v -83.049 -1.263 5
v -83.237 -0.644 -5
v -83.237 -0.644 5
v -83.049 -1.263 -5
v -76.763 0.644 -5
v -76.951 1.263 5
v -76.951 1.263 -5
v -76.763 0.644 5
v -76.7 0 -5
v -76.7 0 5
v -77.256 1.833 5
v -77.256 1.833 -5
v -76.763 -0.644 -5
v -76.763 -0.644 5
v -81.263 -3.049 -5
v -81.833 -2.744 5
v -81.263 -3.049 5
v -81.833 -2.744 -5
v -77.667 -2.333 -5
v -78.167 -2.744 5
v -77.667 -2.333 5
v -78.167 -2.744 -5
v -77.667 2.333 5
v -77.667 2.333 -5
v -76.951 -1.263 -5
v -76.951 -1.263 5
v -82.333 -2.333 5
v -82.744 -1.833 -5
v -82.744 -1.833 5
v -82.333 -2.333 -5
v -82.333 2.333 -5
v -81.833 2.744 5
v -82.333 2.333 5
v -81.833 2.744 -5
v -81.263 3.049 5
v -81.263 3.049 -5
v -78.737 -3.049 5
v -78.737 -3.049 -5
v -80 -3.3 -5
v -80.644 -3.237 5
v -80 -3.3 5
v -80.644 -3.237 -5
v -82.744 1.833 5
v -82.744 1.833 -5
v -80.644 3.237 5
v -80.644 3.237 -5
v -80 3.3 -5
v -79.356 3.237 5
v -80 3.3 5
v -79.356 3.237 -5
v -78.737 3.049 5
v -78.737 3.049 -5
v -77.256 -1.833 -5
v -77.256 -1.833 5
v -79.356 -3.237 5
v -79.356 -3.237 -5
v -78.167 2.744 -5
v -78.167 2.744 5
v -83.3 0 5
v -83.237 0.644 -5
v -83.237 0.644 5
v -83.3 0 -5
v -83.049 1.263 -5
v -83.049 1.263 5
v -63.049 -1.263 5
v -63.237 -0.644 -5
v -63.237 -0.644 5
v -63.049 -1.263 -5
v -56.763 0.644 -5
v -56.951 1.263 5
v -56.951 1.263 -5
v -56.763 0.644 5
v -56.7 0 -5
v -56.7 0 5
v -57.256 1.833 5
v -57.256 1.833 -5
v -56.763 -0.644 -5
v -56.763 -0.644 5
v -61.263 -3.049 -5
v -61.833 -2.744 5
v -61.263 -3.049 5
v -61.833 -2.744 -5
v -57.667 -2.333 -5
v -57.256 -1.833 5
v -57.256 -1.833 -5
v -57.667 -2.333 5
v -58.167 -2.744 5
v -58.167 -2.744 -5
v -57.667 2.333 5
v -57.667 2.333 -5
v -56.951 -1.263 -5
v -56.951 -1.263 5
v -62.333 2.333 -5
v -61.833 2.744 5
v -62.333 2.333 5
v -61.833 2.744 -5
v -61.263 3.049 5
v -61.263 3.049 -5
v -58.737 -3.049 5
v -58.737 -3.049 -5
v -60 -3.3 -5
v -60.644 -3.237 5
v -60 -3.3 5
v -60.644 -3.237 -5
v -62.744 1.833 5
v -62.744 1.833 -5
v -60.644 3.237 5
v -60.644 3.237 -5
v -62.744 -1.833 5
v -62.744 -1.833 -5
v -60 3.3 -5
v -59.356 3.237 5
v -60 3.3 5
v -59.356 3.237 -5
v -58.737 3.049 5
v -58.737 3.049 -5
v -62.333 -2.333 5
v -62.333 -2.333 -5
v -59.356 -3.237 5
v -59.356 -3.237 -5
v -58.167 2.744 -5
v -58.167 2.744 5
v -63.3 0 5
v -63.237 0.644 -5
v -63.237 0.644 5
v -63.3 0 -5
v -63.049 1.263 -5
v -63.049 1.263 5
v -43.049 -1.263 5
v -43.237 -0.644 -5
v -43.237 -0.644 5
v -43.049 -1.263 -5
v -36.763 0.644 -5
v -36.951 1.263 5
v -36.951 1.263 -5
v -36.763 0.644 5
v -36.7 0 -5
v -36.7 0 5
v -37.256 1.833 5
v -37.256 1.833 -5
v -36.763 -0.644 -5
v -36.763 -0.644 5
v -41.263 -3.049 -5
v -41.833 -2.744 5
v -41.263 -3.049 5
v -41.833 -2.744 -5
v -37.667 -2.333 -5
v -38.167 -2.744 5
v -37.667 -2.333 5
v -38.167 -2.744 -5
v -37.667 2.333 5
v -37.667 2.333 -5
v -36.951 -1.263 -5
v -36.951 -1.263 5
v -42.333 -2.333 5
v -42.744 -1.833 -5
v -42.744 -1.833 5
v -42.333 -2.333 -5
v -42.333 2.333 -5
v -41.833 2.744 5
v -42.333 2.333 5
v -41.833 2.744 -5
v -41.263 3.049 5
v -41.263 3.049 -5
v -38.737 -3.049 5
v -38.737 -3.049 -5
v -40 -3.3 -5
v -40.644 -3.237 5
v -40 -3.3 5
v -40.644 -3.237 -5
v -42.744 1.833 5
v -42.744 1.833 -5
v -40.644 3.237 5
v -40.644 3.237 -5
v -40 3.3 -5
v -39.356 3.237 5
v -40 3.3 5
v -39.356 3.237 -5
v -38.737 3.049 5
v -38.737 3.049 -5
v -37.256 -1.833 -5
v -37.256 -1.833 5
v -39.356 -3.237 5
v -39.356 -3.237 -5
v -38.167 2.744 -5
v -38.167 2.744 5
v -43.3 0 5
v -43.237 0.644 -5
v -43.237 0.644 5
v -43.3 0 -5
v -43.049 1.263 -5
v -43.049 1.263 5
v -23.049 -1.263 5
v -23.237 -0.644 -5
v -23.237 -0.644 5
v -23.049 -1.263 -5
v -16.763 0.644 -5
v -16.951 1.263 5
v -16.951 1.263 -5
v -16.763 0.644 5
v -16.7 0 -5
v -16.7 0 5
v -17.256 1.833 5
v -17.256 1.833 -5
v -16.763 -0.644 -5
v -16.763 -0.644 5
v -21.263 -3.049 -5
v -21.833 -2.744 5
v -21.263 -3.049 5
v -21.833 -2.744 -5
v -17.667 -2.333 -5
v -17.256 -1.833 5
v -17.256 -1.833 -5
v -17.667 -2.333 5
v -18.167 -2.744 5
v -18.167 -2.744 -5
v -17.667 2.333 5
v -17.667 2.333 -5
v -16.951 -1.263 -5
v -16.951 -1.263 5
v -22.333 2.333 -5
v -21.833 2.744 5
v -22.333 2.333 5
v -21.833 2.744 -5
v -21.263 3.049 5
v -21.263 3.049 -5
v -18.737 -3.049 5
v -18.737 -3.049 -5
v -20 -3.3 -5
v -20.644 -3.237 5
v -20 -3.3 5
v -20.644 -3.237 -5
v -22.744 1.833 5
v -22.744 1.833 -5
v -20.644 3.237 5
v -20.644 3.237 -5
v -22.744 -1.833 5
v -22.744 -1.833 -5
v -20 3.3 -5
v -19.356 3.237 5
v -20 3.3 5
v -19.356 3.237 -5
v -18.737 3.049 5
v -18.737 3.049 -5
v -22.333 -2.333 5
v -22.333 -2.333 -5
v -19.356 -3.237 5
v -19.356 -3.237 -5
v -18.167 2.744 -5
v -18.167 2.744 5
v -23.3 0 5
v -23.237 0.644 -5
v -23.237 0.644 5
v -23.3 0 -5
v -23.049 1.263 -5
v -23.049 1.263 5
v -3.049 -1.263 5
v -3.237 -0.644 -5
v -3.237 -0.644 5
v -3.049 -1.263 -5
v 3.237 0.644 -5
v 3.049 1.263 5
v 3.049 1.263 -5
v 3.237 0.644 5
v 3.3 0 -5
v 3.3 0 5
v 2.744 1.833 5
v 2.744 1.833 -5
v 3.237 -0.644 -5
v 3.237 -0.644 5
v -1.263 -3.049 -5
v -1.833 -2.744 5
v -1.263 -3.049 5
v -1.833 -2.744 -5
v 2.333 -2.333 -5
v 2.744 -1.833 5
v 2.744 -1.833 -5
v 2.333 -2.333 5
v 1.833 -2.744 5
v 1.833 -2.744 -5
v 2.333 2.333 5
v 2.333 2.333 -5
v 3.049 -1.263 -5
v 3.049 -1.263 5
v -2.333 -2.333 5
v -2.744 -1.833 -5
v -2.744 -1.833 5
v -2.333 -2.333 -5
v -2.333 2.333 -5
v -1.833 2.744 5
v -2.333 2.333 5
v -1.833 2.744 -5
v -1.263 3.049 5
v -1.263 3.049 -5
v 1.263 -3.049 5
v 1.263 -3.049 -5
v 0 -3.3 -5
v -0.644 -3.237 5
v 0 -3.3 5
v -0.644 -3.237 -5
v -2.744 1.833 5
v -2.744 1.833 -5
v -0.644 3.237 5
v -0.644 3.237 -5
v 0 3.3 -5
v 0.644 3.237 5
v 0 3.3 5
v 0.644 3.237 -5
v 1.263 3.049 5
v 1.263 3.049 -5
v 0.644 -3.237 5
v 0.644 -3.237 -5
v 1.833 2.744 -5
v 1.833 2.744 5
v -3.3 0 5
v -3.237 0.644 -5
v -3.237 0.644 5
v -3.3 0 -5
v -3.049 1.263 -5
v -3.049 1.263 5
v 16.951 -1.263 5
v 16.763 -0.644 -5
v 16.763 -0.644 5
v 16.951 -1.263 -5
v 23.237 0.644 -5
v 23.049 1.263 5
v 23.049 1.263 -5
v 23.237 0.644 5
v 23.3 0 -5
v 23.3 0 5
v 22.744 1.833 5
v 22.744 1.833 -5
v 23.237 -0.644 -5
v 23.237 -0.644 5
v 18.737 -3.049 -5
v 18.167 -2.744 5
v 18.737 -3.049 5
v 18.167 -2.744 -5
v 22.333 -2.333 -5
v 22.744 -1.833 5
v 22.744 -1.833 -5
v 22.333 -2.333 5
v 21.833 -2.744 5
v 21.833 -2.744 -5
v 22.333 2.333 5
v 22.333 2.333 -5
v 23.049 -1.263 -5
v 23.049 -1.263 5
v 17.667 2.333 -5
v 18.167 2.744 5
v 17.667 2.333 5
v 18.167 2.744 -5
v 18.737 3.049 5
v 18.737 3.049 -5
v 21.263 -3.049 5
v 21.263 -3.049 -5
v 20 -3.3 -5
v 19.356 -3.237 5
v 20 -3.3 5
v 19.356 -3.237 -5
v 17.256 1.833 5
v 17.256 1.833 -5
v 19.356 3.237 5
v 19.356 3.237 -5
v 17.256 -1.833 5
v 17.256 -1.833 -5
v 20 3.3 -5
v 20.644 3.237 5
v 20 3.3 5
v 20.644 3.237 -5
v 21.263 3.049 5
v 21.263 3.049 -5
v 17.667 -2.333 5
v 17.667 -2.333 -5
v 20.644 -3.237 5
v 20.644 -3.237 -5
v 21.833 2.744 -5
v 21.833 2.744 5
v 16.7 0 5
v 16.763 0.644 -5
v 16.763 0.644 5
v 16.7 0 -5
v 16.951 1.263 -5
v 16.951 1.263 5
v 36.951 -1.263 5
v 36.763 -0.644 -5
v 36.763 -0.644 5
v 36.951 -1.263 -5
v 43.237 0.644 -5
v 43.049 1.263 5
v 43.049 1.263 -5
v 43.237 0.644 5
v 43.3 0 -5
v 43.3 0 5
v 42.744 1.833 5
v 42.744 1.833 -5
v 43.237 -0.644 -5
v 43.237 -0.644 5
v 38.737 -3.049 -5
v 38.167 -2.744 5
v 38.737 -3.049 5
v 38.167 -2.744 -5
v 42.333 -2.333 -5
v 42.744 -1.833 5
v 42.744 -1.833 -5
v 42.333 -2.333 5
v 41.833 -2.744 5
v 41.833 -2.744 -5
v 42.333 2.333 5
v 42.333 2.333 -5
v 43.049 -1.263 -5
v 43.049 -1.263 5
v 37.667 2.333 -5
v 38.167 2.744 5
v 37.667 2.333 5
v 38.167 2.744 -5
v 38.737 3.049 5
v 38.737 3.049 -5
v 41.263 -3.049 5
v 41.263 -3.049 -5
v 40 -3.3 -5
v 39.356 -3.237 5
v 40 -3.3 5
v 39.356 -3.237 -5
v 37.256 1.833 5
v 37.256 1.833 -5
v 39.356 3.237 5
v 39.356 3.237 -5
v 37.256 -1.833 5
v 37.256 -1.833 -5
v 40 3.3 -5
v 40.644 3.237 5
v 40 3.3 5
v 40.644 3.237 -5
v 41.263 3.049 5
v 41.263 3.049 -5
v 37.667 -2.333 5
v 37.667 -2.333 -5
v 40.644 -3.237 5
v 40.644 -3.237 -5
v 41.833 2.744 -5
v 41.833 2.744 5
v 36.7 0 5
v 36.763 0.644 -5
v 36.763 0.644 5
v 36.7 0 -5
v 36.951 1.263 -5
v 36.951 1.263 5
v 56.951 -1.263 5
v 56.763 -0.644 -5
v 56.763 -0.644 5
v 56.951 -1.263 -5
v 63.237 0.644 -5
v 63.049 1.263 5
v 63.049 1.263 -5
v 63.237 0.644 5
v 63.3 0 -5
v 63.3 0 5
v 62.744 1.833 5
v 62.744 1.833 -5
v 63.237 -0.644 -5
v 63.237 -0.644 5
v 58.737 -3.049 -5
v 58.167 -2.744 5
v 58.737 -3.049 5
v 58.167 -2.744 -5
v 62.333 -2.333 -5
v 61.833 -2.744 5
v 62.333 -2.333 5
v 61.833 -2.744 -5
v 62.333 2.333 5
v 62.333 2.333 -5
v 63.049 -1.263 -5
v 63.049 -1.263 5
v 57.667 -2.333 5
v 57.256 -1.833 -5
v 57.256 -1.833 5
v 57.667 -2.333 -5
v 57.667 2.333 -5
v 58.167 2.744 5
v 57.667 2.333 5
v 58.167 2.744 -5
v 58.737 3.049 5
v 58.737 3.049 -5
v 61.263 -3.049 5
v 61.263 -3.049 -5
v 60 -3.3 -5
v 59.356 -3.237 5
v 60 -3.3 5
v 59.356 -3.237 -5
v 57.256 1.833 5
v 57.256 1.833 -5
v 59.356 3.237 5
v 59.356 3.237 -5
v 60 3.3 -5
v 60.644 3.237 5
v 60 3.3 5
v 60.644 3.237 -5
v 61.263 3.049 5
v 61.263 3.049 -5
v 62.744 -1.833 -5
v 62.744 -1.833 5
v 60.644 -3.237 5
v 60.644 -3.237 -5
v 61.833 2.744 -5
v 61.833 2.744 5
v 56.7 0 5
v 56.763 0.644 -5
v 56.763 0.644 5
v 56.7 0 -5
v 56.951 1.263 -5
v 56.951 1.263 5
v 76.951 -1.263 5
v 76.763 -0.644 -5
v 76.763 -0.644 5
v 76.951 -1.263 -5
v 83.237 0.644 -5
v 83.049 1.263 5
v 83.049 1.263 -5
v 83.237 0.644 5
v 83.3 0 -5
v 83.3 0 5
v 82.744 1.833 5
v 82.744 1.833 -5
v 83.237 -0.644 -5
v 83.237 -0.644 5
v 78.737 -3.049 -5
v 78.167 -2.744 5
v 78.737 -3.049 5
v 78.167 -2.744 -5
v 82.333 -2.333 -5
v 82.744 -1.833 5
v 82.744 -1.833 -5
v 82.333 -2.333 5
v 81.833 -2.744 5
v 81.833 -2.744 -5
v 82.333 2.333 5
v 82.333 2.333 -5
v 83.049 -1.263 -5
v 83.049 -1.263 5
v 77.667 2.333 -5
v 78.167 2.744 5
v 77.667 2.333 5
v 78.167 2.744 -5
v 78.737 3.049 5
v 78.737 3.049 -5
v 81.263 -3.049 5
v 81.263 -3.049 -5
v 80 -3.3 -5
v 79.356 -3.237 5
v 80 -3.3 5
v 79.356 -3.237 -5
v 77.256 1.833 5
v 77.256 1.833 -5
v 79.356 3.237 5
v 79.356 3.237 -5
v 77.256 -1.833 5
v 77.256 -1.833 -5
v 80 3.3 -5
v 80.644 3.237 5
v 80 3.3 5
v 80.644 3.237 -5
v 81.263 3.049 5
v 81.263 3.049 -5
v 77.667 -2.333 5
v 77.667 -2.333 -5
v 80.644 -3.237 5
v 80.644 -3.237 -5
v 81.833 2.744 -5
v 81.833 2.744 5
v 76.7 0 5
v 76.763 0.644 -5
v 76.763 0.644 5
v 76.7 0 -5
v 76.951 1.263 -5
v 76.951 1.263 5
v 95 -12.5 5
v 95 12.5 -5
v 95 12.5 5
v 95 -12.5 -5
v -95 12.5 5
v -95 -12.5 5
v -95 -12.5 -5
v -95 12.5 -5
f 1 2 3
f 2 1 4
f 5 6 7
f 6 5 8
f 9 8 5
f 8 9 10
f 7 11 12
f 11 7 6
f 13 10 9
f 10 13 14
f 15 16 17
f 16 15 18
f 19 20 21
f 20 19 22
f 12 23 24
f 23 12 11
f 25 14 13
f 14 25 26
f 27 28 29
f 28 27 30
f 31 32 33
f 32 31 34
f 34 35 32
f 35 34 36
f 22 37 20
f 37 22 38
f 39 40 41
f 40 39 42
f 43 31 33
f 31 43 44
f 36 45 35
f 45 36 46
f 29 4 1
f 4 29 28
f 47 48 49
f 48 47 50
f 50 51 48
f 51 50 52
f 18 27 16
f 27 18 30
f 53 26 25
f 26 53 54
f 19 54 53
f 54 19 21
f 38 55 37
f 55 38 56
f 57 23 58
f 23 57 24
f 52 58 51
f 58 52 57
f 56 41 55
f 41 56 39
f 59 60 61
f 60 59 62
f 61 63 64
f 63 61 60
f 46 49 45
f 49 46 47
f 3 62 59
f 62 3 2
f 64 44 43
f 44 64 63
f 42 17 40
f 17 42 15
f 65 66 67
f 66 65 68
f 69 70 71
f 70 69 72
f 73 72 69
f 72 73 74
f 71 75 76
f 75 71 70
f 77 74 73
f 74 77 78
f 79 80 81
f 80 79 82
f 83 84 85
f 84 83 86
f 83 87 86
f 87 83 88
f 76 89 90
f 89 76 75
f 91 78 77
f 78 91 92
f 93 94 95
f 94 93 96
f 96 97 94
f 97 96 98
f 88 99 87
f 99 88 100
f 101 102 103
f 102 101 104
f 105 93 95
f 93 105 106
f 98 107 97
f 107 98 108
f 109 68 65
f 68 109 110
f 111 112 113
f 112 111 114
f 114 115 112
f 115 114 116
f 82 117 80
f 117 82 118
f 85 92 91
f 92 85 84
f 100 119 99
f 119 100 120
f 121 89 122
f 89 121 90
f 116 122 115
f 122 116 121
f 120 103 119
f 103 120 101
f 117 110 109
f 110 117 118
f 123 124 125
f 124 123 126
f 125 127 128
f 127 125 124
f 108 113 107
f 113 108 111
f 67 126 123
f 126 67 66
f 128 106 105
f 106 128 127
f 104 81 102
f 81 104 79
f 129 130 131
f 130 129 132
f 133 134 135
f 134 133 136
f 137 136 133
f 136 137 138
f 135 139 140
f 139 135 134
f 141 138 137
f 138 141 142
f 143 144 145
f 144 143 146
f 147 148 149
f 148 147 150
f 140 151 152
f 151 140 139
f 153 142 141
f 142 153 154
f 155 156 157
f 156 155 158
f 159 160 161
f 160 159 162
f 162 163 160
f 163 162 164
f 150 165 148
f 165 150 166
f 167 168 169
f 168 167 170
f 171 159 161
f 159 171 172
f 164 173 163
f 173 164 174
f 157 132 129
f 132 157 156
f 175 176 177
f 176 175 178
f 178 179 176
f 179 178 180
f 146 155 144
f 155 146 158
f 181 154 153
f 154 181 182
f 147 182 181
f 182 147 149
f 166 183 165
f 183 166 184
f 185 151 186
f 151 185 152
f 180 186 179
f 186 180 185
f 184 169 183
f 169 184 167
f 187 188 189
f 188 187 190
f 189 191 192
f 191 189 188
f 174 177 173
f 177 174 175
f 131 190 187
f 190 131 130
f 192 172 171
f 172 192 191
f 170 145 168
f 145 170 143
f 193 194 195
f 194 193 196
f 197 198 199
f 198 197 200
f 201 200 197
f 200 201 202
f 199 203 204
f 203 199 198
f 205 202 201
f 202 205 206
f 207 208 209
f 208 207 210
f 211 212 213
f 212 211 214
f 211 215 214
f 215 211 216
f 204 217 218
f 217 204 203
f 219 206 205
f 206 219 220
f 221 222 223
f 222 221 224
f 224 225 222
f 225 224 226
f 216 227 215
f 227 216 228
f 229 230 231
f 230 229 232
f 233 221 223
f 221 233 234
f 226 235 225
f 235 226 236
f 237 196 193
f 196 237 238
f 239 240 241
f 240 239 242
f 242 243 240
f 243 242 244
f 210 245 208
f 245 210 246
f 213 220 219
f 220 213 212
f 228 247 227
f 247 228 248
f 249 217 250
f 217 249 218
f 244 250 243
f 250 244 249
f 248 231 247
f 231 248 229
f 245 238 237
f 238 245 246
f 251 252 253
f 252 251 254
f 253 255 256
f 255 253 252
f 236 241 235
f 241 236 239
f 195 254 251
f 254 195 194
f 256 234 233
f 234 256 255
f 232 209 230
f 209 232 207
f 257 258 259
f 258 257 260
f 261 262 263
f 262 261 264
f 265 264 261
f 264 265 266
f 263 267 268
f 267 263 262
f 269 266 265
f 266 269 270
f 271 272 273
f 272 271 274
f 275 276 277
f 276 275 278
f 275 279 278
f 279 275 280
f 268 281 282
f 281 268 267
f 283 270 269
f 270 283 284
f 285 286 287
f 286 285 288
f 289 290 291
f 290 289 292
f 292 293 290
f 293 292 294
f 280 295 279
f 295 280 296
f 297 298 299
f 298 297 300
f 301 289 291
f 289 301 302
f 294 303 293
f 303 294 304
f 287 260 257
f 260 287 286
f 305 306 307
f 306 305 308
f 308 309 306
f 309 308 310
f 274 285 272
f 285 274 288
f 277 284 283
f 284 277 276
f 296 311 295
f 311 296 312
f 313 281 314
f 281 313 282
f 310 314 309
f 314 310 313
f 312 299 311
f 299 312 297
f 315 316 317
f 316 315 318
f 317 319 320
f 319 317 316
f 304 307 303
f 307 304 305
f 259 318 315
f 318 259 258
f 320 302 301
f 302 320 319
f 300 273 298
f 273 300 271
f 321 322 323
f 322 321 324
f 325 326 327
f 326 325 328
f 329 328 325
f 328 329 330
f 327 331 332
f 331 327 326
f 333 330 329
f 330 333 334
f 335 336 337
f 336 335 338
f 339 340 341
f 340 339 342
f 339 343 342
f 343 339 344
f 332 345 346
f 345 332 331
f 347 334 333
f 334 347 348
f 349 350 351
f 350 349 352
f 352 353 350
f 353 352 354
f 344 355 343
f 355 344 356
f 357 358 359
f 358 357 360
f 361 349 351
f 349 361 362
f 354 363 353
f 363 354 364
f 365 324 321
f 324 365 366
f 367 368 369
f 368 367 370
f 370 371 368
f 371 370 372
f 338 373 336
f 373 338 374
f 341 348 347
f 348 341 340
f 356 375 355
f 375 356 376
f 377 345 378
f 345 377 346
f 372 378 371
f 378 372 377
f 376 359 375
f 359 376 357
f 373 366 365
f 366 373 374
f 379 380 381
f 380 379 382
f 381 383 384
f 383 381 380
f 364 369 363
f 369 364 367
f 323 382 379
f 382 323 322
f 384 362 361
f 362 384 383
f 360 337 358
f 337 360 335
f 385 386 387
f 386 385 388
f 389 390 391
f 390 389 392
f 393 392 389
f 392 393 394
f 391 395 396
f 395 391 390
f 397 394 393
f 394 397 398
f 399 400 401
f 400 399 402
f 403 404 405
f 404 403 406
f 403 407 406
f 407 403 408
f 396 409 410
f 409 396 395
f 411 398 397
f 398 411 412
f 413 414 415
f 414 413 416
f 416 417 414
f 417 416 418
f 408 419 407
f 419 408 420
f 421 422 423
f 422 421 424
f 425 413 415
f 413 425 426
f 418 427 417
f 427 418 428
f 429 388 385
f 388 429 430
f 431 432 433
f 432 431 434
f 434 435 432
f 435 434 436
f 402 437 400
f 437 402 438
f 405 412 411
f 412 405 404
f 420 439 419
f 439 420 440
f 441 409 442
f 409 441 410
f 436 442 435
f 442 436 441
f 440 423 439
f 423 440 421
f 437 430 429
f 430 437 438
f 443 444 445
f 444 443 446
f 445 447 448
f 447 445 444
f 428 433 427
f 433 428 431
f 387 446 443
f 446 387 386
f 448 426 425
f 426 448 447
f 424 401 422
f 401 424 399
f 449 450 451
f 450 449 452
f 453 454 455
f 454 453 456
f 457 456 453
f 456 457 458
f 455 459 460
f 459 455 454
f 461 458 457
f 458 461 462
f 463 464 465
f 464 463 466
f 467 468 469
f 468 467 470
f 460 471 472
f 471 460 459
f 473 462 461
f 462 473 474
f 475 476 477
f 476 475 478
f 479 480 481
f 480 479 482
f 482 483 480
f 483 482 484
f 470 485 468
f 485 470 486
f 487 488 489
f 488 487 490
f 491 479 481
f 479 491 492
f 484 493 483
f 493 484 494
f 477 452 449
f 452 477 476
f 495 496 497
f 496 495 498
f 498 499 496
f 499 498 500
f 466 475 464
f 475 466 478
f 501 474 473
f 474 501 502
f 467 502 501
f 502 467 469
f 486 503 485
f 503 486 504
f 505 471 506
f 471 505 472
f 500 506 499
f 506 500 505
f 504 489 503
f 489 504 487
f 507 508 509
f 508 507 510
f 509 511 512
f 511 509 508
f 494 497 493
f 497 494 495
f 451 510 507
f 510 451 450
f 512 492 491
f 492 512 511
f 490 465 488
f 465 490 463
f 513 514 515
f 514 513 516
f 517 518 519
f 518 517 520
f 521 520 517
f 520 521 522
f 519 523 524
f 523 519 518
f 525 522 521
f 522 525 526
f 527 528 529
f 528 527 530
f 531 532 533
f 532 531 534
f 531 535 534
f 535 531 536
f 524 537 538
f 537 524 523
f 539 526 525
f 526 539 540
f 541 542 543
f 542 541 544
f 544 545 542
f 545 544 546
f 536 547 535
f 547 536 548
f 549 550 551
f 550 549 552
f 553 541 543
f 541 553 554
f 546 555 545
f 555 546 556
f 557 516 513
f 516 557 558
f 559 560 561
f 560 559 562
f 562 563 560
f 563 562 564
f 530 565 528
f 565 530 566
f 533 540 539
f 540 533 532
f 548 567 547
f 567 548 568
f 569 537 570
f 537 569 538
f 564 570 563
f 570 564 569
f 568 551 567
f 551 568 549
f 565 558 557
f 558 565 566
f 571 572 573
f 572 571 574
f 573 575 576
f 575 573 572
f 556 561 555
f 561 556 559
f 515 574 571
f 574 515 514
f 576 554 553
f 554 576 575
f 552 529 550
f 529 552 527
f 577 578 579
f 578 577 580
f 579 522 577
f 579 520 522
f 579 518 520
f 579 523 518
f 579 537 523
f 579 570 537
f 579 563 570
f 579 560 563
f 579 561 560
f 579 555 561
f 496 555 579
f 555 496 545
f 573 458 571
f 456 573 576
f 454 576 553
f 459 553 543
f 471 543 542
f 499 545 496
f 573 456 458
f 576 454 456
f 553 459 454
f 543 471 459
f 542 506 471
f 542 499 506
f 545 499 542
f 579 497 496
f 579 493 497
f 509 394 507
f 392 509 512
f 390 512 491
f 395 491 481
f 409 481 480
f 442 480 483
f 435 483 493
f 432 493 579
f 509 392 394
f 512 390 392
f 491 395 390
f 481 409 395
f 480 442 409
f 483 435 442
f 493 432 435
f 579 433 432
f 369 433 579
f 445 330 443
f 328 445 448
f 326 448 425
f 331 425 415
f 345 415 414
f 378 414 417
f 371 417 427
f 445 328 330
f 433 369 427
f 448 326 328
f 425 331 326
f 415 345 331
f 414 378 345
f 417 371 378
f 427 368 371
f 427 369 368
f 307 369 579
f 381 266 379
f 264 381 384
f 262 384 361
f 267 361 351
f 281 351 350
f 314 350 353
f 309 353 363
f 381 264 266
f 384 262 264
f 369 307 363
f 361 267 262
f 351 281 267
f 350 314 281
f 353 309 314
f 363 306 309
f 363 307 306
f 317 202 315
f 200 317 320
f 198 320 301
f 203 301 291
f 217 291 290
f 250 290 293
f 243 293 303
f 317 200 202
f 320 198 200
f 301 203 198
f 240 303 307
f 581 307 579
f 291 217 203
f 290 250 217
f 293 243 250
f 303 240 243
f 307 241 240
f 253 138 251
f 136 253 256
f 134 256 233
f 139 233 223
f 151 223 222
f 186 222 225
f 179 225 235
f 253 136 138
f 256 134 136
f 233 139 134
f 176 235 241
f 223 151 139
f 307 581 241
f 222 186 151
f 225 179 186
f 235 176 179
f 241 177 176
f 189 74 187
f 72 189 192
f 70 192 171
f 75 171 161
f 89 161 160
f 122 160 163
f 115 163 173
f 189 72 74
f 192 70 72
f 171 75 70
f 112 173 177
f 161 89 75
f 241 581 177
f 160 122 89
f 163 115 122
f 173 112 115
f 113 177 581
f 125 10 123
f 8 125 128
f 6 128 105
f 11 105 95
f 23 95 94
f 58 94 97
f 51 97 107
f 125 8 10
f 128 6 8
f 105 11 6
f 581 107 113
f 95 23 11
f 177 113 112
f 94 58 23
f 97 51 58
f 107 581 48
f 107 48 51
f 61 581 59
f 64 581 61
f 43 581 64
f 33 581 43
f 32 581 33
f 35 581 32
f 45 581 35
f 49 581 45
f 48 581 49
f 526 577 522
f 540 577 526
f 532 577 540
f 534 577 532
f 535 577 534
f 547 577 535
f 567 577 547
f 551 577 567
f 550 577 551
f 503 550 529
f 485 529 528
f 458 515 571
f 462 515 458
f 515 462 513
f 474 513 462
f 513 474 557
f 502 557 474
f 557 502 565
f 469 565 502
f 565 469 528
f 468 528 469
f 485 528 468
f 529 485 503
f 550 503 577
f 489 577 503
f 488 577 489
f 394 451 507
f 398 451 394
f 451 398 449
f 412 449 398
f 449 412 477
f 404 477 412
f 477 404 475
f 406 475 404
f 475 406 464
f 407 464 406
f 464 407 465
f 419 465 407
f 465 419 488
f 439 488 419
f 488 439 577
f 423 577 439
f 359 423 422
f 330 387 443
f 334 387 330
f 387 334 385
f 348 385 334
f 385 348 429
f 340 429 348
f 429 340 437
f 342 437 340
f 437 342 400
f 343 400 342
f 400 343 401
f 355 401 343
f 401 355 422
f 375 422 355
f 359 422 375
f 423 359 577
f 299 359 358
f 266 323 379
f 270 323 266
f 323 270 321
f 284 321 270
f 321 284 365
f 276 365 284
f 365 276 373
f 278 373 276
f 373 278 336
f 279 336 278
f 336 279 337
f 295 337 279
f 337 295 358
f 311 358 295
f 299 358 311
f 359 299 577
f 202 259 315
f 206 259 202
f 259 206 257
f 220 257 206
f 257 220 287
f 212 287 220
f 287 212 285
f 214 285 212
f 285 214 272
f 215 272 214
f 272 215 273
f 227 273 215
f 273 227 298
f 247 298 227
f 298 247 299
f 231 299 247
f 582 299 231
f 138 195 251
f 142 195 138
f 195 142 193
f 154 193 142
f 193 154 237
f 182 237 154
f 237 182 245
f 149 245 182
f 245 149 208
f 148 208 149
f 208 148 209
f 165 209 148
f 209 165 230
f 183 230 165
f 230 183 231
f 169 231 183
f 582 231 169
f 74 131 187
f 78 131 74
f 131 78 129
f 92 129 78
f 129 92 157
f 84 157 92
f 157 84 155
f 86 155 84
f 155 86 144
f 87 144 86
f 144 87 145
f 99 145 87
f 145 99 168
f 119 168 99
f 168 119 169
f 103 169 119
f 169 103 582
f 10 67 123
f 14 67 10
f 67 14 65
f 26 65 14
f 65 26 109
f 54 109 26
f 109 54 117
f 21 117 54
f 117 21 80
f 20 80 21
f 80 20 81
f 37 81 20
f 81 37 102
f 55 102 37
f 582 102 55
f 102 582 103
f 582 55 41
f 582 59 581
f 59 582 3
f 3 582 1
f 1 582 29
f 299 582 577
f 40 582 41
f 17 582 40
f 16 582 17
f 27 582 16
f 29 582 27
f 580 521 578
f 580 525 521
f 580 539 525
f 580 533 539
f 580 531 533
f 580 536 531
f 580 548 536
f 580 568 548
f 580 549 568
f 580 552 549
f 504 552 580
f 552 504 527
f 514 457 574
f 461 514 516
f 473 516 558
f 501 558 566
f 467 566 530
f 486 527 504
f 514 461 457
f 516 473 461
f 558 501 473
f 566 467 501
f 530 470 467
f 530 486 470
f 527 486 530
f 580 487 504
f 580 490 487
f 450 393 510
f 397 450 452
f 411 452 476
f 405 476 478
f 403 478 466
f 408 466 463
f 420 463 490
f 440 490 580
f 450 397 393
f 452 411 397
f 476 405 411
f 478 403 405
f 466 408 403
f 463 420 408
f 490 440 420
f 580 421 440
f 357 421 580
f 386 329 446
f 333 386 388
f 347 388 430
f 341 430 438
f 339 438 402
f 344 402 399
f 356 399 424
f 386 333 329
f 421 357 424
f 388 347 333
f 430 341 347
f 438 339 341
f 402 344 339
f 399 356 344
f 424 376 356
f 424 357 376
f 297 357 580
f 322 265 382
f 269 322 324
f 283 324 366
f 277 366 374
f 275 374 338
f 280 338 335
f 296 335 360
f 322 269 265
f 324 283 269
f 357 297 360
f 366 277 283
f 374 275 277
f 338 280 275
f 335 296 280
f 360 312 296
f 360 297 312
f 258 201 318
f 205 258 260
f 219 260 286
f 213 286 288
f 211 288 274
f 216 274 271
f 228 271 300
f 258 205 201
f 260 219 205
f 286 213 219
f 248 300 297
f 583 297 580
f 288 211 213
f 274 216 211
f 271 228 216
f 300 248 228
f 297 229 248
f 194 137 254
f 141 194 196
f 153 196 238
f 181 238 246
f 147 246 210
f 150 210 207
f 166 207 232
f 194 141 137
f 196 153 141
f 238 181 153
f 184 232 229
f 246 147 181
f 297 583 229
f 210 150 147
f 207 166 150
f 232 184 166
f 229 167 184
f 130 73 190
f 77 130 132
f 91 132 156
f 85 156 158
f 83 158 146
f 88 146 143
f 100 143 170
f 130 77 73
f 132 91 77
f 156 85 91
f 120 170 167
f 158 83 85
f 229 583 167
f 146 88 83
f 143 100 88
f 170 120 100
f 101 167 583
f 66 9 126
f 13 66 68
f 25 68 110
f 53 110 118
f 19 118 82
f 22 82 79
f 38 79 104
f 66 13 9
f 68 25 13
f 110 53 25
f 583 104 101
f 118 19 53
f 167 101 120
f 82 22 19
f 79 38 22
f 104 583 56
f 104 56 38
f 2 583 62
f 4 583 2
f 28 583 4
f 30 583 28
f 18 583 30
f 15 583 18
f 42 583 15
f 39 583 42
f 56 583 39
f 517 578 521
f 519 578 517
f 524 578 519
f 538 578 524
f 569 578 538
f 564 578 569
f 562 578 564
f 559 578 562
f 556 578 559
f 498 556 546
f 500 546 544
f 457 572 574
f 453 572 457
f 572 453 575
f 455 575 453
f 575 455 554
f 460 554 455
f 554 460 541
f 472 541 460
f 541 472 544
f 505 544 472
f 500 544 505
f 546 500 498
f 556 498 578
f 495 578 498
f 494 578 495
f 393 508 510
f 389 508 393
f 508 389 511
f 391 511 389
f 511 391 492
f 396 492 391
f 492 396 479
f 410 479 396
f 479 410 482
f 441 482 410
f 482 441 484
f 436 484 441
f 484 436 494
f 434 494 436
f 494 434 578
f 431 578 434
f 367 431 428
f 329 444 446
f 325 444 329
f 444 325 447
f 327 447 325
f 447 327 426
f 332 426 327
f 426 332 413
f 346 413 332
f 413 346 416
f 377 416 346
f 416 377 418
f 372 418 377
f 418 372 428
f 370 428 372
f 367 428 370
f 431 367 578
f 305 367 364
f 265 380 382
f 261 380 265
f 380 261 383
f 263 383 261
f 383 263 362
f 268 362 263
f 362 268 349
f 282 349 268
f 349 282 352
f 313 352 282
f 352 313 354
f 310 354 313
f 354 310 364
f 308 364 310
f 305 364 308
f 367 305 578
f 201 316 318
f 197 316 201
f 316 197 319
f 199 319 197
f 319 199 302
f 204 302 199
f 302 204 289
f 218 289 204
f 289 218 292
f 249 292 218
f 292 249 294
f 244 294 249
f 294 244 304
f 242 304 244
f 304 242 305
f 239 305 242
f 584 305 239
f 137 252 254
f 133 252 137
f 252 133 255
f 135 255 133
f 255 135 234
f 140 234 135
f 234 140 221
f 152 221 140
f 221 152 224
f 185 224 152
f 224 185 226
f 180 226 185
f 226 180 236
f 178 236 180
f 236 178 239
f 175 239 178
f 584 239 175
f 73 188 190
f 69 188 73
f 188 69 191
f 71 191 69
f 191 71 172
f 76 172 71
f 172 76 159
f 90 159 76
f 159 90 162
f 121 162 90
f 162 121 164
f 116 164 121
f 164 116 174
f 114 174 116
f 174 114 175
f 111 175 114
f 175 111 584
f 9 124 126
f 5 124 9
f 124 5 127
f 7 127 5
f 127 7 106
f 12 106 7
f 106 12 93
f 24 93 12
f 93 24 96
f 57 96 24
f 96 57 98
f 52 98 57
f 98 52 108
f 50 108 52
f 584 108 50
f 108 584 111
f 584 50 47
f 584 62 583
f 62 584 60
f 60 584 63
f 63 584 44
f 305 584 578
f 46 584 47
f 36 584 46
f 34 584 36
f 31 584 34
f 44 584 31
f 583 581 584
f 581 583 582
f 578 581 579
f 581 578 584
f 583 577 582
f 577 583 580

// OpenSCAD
$fn = 32;

// ----------------------------------------------------------------------
// Hole bar, 9 x Ø6.6
// skip layout, 15 mm edge offset
// ----------------------------------------------------------------------

// --- parameters (mm) ---
bar_w = 25;       // bar width (Y)
bar_t = 10;       // bar thickness (Z)
holes = 9;        // holes per row
hole_d = 6.6;     // hole diameter
edge = 15;        // offset from the bar end to the first hole
grid_pitch = 10;  // grid the bar was laid out on

// --- derived feature positions (mm) ---
pitch = grid_pitch * 2;       // = 20   holes sit every other grid slot
span = (holes - 1) * pitch;   // = 160   distance between the end holes
bar_l = span + 2 * edge;      // = 190   overall bar length
start_x = -bar_l / 2 + edge;  // = -80   X of the first hole
feature_centers = [
  [start_x + 0 * pitch, 0],
  [start_x + 1 * pitch, 0],
  [start_x + 2 * pitch, 0],
  [start_x + 3 * pitch, 0],
  [start_x + 4 * pitch, 0],
  [start_x + 5 * pitch, 0],
  [start_x + 6 * pitch, 0],
  [start_x + 7 * pitch, 0],
  [start_x + 8 * pitch, 0]
];   // hole centres of the first row

// bar with one row of holes, drilled from feature_centers
difference() {
  translate([-bar_l / 2, -bar_w / 2, -bar_t / 2]) cube([bar_l, bar_w, bar_t]);
  for (centre = feature_centers)
    translate([centre[0], centre[1], 0])
      cylinder(d = hole_d, h = bar_t + 2, center = true);
}
